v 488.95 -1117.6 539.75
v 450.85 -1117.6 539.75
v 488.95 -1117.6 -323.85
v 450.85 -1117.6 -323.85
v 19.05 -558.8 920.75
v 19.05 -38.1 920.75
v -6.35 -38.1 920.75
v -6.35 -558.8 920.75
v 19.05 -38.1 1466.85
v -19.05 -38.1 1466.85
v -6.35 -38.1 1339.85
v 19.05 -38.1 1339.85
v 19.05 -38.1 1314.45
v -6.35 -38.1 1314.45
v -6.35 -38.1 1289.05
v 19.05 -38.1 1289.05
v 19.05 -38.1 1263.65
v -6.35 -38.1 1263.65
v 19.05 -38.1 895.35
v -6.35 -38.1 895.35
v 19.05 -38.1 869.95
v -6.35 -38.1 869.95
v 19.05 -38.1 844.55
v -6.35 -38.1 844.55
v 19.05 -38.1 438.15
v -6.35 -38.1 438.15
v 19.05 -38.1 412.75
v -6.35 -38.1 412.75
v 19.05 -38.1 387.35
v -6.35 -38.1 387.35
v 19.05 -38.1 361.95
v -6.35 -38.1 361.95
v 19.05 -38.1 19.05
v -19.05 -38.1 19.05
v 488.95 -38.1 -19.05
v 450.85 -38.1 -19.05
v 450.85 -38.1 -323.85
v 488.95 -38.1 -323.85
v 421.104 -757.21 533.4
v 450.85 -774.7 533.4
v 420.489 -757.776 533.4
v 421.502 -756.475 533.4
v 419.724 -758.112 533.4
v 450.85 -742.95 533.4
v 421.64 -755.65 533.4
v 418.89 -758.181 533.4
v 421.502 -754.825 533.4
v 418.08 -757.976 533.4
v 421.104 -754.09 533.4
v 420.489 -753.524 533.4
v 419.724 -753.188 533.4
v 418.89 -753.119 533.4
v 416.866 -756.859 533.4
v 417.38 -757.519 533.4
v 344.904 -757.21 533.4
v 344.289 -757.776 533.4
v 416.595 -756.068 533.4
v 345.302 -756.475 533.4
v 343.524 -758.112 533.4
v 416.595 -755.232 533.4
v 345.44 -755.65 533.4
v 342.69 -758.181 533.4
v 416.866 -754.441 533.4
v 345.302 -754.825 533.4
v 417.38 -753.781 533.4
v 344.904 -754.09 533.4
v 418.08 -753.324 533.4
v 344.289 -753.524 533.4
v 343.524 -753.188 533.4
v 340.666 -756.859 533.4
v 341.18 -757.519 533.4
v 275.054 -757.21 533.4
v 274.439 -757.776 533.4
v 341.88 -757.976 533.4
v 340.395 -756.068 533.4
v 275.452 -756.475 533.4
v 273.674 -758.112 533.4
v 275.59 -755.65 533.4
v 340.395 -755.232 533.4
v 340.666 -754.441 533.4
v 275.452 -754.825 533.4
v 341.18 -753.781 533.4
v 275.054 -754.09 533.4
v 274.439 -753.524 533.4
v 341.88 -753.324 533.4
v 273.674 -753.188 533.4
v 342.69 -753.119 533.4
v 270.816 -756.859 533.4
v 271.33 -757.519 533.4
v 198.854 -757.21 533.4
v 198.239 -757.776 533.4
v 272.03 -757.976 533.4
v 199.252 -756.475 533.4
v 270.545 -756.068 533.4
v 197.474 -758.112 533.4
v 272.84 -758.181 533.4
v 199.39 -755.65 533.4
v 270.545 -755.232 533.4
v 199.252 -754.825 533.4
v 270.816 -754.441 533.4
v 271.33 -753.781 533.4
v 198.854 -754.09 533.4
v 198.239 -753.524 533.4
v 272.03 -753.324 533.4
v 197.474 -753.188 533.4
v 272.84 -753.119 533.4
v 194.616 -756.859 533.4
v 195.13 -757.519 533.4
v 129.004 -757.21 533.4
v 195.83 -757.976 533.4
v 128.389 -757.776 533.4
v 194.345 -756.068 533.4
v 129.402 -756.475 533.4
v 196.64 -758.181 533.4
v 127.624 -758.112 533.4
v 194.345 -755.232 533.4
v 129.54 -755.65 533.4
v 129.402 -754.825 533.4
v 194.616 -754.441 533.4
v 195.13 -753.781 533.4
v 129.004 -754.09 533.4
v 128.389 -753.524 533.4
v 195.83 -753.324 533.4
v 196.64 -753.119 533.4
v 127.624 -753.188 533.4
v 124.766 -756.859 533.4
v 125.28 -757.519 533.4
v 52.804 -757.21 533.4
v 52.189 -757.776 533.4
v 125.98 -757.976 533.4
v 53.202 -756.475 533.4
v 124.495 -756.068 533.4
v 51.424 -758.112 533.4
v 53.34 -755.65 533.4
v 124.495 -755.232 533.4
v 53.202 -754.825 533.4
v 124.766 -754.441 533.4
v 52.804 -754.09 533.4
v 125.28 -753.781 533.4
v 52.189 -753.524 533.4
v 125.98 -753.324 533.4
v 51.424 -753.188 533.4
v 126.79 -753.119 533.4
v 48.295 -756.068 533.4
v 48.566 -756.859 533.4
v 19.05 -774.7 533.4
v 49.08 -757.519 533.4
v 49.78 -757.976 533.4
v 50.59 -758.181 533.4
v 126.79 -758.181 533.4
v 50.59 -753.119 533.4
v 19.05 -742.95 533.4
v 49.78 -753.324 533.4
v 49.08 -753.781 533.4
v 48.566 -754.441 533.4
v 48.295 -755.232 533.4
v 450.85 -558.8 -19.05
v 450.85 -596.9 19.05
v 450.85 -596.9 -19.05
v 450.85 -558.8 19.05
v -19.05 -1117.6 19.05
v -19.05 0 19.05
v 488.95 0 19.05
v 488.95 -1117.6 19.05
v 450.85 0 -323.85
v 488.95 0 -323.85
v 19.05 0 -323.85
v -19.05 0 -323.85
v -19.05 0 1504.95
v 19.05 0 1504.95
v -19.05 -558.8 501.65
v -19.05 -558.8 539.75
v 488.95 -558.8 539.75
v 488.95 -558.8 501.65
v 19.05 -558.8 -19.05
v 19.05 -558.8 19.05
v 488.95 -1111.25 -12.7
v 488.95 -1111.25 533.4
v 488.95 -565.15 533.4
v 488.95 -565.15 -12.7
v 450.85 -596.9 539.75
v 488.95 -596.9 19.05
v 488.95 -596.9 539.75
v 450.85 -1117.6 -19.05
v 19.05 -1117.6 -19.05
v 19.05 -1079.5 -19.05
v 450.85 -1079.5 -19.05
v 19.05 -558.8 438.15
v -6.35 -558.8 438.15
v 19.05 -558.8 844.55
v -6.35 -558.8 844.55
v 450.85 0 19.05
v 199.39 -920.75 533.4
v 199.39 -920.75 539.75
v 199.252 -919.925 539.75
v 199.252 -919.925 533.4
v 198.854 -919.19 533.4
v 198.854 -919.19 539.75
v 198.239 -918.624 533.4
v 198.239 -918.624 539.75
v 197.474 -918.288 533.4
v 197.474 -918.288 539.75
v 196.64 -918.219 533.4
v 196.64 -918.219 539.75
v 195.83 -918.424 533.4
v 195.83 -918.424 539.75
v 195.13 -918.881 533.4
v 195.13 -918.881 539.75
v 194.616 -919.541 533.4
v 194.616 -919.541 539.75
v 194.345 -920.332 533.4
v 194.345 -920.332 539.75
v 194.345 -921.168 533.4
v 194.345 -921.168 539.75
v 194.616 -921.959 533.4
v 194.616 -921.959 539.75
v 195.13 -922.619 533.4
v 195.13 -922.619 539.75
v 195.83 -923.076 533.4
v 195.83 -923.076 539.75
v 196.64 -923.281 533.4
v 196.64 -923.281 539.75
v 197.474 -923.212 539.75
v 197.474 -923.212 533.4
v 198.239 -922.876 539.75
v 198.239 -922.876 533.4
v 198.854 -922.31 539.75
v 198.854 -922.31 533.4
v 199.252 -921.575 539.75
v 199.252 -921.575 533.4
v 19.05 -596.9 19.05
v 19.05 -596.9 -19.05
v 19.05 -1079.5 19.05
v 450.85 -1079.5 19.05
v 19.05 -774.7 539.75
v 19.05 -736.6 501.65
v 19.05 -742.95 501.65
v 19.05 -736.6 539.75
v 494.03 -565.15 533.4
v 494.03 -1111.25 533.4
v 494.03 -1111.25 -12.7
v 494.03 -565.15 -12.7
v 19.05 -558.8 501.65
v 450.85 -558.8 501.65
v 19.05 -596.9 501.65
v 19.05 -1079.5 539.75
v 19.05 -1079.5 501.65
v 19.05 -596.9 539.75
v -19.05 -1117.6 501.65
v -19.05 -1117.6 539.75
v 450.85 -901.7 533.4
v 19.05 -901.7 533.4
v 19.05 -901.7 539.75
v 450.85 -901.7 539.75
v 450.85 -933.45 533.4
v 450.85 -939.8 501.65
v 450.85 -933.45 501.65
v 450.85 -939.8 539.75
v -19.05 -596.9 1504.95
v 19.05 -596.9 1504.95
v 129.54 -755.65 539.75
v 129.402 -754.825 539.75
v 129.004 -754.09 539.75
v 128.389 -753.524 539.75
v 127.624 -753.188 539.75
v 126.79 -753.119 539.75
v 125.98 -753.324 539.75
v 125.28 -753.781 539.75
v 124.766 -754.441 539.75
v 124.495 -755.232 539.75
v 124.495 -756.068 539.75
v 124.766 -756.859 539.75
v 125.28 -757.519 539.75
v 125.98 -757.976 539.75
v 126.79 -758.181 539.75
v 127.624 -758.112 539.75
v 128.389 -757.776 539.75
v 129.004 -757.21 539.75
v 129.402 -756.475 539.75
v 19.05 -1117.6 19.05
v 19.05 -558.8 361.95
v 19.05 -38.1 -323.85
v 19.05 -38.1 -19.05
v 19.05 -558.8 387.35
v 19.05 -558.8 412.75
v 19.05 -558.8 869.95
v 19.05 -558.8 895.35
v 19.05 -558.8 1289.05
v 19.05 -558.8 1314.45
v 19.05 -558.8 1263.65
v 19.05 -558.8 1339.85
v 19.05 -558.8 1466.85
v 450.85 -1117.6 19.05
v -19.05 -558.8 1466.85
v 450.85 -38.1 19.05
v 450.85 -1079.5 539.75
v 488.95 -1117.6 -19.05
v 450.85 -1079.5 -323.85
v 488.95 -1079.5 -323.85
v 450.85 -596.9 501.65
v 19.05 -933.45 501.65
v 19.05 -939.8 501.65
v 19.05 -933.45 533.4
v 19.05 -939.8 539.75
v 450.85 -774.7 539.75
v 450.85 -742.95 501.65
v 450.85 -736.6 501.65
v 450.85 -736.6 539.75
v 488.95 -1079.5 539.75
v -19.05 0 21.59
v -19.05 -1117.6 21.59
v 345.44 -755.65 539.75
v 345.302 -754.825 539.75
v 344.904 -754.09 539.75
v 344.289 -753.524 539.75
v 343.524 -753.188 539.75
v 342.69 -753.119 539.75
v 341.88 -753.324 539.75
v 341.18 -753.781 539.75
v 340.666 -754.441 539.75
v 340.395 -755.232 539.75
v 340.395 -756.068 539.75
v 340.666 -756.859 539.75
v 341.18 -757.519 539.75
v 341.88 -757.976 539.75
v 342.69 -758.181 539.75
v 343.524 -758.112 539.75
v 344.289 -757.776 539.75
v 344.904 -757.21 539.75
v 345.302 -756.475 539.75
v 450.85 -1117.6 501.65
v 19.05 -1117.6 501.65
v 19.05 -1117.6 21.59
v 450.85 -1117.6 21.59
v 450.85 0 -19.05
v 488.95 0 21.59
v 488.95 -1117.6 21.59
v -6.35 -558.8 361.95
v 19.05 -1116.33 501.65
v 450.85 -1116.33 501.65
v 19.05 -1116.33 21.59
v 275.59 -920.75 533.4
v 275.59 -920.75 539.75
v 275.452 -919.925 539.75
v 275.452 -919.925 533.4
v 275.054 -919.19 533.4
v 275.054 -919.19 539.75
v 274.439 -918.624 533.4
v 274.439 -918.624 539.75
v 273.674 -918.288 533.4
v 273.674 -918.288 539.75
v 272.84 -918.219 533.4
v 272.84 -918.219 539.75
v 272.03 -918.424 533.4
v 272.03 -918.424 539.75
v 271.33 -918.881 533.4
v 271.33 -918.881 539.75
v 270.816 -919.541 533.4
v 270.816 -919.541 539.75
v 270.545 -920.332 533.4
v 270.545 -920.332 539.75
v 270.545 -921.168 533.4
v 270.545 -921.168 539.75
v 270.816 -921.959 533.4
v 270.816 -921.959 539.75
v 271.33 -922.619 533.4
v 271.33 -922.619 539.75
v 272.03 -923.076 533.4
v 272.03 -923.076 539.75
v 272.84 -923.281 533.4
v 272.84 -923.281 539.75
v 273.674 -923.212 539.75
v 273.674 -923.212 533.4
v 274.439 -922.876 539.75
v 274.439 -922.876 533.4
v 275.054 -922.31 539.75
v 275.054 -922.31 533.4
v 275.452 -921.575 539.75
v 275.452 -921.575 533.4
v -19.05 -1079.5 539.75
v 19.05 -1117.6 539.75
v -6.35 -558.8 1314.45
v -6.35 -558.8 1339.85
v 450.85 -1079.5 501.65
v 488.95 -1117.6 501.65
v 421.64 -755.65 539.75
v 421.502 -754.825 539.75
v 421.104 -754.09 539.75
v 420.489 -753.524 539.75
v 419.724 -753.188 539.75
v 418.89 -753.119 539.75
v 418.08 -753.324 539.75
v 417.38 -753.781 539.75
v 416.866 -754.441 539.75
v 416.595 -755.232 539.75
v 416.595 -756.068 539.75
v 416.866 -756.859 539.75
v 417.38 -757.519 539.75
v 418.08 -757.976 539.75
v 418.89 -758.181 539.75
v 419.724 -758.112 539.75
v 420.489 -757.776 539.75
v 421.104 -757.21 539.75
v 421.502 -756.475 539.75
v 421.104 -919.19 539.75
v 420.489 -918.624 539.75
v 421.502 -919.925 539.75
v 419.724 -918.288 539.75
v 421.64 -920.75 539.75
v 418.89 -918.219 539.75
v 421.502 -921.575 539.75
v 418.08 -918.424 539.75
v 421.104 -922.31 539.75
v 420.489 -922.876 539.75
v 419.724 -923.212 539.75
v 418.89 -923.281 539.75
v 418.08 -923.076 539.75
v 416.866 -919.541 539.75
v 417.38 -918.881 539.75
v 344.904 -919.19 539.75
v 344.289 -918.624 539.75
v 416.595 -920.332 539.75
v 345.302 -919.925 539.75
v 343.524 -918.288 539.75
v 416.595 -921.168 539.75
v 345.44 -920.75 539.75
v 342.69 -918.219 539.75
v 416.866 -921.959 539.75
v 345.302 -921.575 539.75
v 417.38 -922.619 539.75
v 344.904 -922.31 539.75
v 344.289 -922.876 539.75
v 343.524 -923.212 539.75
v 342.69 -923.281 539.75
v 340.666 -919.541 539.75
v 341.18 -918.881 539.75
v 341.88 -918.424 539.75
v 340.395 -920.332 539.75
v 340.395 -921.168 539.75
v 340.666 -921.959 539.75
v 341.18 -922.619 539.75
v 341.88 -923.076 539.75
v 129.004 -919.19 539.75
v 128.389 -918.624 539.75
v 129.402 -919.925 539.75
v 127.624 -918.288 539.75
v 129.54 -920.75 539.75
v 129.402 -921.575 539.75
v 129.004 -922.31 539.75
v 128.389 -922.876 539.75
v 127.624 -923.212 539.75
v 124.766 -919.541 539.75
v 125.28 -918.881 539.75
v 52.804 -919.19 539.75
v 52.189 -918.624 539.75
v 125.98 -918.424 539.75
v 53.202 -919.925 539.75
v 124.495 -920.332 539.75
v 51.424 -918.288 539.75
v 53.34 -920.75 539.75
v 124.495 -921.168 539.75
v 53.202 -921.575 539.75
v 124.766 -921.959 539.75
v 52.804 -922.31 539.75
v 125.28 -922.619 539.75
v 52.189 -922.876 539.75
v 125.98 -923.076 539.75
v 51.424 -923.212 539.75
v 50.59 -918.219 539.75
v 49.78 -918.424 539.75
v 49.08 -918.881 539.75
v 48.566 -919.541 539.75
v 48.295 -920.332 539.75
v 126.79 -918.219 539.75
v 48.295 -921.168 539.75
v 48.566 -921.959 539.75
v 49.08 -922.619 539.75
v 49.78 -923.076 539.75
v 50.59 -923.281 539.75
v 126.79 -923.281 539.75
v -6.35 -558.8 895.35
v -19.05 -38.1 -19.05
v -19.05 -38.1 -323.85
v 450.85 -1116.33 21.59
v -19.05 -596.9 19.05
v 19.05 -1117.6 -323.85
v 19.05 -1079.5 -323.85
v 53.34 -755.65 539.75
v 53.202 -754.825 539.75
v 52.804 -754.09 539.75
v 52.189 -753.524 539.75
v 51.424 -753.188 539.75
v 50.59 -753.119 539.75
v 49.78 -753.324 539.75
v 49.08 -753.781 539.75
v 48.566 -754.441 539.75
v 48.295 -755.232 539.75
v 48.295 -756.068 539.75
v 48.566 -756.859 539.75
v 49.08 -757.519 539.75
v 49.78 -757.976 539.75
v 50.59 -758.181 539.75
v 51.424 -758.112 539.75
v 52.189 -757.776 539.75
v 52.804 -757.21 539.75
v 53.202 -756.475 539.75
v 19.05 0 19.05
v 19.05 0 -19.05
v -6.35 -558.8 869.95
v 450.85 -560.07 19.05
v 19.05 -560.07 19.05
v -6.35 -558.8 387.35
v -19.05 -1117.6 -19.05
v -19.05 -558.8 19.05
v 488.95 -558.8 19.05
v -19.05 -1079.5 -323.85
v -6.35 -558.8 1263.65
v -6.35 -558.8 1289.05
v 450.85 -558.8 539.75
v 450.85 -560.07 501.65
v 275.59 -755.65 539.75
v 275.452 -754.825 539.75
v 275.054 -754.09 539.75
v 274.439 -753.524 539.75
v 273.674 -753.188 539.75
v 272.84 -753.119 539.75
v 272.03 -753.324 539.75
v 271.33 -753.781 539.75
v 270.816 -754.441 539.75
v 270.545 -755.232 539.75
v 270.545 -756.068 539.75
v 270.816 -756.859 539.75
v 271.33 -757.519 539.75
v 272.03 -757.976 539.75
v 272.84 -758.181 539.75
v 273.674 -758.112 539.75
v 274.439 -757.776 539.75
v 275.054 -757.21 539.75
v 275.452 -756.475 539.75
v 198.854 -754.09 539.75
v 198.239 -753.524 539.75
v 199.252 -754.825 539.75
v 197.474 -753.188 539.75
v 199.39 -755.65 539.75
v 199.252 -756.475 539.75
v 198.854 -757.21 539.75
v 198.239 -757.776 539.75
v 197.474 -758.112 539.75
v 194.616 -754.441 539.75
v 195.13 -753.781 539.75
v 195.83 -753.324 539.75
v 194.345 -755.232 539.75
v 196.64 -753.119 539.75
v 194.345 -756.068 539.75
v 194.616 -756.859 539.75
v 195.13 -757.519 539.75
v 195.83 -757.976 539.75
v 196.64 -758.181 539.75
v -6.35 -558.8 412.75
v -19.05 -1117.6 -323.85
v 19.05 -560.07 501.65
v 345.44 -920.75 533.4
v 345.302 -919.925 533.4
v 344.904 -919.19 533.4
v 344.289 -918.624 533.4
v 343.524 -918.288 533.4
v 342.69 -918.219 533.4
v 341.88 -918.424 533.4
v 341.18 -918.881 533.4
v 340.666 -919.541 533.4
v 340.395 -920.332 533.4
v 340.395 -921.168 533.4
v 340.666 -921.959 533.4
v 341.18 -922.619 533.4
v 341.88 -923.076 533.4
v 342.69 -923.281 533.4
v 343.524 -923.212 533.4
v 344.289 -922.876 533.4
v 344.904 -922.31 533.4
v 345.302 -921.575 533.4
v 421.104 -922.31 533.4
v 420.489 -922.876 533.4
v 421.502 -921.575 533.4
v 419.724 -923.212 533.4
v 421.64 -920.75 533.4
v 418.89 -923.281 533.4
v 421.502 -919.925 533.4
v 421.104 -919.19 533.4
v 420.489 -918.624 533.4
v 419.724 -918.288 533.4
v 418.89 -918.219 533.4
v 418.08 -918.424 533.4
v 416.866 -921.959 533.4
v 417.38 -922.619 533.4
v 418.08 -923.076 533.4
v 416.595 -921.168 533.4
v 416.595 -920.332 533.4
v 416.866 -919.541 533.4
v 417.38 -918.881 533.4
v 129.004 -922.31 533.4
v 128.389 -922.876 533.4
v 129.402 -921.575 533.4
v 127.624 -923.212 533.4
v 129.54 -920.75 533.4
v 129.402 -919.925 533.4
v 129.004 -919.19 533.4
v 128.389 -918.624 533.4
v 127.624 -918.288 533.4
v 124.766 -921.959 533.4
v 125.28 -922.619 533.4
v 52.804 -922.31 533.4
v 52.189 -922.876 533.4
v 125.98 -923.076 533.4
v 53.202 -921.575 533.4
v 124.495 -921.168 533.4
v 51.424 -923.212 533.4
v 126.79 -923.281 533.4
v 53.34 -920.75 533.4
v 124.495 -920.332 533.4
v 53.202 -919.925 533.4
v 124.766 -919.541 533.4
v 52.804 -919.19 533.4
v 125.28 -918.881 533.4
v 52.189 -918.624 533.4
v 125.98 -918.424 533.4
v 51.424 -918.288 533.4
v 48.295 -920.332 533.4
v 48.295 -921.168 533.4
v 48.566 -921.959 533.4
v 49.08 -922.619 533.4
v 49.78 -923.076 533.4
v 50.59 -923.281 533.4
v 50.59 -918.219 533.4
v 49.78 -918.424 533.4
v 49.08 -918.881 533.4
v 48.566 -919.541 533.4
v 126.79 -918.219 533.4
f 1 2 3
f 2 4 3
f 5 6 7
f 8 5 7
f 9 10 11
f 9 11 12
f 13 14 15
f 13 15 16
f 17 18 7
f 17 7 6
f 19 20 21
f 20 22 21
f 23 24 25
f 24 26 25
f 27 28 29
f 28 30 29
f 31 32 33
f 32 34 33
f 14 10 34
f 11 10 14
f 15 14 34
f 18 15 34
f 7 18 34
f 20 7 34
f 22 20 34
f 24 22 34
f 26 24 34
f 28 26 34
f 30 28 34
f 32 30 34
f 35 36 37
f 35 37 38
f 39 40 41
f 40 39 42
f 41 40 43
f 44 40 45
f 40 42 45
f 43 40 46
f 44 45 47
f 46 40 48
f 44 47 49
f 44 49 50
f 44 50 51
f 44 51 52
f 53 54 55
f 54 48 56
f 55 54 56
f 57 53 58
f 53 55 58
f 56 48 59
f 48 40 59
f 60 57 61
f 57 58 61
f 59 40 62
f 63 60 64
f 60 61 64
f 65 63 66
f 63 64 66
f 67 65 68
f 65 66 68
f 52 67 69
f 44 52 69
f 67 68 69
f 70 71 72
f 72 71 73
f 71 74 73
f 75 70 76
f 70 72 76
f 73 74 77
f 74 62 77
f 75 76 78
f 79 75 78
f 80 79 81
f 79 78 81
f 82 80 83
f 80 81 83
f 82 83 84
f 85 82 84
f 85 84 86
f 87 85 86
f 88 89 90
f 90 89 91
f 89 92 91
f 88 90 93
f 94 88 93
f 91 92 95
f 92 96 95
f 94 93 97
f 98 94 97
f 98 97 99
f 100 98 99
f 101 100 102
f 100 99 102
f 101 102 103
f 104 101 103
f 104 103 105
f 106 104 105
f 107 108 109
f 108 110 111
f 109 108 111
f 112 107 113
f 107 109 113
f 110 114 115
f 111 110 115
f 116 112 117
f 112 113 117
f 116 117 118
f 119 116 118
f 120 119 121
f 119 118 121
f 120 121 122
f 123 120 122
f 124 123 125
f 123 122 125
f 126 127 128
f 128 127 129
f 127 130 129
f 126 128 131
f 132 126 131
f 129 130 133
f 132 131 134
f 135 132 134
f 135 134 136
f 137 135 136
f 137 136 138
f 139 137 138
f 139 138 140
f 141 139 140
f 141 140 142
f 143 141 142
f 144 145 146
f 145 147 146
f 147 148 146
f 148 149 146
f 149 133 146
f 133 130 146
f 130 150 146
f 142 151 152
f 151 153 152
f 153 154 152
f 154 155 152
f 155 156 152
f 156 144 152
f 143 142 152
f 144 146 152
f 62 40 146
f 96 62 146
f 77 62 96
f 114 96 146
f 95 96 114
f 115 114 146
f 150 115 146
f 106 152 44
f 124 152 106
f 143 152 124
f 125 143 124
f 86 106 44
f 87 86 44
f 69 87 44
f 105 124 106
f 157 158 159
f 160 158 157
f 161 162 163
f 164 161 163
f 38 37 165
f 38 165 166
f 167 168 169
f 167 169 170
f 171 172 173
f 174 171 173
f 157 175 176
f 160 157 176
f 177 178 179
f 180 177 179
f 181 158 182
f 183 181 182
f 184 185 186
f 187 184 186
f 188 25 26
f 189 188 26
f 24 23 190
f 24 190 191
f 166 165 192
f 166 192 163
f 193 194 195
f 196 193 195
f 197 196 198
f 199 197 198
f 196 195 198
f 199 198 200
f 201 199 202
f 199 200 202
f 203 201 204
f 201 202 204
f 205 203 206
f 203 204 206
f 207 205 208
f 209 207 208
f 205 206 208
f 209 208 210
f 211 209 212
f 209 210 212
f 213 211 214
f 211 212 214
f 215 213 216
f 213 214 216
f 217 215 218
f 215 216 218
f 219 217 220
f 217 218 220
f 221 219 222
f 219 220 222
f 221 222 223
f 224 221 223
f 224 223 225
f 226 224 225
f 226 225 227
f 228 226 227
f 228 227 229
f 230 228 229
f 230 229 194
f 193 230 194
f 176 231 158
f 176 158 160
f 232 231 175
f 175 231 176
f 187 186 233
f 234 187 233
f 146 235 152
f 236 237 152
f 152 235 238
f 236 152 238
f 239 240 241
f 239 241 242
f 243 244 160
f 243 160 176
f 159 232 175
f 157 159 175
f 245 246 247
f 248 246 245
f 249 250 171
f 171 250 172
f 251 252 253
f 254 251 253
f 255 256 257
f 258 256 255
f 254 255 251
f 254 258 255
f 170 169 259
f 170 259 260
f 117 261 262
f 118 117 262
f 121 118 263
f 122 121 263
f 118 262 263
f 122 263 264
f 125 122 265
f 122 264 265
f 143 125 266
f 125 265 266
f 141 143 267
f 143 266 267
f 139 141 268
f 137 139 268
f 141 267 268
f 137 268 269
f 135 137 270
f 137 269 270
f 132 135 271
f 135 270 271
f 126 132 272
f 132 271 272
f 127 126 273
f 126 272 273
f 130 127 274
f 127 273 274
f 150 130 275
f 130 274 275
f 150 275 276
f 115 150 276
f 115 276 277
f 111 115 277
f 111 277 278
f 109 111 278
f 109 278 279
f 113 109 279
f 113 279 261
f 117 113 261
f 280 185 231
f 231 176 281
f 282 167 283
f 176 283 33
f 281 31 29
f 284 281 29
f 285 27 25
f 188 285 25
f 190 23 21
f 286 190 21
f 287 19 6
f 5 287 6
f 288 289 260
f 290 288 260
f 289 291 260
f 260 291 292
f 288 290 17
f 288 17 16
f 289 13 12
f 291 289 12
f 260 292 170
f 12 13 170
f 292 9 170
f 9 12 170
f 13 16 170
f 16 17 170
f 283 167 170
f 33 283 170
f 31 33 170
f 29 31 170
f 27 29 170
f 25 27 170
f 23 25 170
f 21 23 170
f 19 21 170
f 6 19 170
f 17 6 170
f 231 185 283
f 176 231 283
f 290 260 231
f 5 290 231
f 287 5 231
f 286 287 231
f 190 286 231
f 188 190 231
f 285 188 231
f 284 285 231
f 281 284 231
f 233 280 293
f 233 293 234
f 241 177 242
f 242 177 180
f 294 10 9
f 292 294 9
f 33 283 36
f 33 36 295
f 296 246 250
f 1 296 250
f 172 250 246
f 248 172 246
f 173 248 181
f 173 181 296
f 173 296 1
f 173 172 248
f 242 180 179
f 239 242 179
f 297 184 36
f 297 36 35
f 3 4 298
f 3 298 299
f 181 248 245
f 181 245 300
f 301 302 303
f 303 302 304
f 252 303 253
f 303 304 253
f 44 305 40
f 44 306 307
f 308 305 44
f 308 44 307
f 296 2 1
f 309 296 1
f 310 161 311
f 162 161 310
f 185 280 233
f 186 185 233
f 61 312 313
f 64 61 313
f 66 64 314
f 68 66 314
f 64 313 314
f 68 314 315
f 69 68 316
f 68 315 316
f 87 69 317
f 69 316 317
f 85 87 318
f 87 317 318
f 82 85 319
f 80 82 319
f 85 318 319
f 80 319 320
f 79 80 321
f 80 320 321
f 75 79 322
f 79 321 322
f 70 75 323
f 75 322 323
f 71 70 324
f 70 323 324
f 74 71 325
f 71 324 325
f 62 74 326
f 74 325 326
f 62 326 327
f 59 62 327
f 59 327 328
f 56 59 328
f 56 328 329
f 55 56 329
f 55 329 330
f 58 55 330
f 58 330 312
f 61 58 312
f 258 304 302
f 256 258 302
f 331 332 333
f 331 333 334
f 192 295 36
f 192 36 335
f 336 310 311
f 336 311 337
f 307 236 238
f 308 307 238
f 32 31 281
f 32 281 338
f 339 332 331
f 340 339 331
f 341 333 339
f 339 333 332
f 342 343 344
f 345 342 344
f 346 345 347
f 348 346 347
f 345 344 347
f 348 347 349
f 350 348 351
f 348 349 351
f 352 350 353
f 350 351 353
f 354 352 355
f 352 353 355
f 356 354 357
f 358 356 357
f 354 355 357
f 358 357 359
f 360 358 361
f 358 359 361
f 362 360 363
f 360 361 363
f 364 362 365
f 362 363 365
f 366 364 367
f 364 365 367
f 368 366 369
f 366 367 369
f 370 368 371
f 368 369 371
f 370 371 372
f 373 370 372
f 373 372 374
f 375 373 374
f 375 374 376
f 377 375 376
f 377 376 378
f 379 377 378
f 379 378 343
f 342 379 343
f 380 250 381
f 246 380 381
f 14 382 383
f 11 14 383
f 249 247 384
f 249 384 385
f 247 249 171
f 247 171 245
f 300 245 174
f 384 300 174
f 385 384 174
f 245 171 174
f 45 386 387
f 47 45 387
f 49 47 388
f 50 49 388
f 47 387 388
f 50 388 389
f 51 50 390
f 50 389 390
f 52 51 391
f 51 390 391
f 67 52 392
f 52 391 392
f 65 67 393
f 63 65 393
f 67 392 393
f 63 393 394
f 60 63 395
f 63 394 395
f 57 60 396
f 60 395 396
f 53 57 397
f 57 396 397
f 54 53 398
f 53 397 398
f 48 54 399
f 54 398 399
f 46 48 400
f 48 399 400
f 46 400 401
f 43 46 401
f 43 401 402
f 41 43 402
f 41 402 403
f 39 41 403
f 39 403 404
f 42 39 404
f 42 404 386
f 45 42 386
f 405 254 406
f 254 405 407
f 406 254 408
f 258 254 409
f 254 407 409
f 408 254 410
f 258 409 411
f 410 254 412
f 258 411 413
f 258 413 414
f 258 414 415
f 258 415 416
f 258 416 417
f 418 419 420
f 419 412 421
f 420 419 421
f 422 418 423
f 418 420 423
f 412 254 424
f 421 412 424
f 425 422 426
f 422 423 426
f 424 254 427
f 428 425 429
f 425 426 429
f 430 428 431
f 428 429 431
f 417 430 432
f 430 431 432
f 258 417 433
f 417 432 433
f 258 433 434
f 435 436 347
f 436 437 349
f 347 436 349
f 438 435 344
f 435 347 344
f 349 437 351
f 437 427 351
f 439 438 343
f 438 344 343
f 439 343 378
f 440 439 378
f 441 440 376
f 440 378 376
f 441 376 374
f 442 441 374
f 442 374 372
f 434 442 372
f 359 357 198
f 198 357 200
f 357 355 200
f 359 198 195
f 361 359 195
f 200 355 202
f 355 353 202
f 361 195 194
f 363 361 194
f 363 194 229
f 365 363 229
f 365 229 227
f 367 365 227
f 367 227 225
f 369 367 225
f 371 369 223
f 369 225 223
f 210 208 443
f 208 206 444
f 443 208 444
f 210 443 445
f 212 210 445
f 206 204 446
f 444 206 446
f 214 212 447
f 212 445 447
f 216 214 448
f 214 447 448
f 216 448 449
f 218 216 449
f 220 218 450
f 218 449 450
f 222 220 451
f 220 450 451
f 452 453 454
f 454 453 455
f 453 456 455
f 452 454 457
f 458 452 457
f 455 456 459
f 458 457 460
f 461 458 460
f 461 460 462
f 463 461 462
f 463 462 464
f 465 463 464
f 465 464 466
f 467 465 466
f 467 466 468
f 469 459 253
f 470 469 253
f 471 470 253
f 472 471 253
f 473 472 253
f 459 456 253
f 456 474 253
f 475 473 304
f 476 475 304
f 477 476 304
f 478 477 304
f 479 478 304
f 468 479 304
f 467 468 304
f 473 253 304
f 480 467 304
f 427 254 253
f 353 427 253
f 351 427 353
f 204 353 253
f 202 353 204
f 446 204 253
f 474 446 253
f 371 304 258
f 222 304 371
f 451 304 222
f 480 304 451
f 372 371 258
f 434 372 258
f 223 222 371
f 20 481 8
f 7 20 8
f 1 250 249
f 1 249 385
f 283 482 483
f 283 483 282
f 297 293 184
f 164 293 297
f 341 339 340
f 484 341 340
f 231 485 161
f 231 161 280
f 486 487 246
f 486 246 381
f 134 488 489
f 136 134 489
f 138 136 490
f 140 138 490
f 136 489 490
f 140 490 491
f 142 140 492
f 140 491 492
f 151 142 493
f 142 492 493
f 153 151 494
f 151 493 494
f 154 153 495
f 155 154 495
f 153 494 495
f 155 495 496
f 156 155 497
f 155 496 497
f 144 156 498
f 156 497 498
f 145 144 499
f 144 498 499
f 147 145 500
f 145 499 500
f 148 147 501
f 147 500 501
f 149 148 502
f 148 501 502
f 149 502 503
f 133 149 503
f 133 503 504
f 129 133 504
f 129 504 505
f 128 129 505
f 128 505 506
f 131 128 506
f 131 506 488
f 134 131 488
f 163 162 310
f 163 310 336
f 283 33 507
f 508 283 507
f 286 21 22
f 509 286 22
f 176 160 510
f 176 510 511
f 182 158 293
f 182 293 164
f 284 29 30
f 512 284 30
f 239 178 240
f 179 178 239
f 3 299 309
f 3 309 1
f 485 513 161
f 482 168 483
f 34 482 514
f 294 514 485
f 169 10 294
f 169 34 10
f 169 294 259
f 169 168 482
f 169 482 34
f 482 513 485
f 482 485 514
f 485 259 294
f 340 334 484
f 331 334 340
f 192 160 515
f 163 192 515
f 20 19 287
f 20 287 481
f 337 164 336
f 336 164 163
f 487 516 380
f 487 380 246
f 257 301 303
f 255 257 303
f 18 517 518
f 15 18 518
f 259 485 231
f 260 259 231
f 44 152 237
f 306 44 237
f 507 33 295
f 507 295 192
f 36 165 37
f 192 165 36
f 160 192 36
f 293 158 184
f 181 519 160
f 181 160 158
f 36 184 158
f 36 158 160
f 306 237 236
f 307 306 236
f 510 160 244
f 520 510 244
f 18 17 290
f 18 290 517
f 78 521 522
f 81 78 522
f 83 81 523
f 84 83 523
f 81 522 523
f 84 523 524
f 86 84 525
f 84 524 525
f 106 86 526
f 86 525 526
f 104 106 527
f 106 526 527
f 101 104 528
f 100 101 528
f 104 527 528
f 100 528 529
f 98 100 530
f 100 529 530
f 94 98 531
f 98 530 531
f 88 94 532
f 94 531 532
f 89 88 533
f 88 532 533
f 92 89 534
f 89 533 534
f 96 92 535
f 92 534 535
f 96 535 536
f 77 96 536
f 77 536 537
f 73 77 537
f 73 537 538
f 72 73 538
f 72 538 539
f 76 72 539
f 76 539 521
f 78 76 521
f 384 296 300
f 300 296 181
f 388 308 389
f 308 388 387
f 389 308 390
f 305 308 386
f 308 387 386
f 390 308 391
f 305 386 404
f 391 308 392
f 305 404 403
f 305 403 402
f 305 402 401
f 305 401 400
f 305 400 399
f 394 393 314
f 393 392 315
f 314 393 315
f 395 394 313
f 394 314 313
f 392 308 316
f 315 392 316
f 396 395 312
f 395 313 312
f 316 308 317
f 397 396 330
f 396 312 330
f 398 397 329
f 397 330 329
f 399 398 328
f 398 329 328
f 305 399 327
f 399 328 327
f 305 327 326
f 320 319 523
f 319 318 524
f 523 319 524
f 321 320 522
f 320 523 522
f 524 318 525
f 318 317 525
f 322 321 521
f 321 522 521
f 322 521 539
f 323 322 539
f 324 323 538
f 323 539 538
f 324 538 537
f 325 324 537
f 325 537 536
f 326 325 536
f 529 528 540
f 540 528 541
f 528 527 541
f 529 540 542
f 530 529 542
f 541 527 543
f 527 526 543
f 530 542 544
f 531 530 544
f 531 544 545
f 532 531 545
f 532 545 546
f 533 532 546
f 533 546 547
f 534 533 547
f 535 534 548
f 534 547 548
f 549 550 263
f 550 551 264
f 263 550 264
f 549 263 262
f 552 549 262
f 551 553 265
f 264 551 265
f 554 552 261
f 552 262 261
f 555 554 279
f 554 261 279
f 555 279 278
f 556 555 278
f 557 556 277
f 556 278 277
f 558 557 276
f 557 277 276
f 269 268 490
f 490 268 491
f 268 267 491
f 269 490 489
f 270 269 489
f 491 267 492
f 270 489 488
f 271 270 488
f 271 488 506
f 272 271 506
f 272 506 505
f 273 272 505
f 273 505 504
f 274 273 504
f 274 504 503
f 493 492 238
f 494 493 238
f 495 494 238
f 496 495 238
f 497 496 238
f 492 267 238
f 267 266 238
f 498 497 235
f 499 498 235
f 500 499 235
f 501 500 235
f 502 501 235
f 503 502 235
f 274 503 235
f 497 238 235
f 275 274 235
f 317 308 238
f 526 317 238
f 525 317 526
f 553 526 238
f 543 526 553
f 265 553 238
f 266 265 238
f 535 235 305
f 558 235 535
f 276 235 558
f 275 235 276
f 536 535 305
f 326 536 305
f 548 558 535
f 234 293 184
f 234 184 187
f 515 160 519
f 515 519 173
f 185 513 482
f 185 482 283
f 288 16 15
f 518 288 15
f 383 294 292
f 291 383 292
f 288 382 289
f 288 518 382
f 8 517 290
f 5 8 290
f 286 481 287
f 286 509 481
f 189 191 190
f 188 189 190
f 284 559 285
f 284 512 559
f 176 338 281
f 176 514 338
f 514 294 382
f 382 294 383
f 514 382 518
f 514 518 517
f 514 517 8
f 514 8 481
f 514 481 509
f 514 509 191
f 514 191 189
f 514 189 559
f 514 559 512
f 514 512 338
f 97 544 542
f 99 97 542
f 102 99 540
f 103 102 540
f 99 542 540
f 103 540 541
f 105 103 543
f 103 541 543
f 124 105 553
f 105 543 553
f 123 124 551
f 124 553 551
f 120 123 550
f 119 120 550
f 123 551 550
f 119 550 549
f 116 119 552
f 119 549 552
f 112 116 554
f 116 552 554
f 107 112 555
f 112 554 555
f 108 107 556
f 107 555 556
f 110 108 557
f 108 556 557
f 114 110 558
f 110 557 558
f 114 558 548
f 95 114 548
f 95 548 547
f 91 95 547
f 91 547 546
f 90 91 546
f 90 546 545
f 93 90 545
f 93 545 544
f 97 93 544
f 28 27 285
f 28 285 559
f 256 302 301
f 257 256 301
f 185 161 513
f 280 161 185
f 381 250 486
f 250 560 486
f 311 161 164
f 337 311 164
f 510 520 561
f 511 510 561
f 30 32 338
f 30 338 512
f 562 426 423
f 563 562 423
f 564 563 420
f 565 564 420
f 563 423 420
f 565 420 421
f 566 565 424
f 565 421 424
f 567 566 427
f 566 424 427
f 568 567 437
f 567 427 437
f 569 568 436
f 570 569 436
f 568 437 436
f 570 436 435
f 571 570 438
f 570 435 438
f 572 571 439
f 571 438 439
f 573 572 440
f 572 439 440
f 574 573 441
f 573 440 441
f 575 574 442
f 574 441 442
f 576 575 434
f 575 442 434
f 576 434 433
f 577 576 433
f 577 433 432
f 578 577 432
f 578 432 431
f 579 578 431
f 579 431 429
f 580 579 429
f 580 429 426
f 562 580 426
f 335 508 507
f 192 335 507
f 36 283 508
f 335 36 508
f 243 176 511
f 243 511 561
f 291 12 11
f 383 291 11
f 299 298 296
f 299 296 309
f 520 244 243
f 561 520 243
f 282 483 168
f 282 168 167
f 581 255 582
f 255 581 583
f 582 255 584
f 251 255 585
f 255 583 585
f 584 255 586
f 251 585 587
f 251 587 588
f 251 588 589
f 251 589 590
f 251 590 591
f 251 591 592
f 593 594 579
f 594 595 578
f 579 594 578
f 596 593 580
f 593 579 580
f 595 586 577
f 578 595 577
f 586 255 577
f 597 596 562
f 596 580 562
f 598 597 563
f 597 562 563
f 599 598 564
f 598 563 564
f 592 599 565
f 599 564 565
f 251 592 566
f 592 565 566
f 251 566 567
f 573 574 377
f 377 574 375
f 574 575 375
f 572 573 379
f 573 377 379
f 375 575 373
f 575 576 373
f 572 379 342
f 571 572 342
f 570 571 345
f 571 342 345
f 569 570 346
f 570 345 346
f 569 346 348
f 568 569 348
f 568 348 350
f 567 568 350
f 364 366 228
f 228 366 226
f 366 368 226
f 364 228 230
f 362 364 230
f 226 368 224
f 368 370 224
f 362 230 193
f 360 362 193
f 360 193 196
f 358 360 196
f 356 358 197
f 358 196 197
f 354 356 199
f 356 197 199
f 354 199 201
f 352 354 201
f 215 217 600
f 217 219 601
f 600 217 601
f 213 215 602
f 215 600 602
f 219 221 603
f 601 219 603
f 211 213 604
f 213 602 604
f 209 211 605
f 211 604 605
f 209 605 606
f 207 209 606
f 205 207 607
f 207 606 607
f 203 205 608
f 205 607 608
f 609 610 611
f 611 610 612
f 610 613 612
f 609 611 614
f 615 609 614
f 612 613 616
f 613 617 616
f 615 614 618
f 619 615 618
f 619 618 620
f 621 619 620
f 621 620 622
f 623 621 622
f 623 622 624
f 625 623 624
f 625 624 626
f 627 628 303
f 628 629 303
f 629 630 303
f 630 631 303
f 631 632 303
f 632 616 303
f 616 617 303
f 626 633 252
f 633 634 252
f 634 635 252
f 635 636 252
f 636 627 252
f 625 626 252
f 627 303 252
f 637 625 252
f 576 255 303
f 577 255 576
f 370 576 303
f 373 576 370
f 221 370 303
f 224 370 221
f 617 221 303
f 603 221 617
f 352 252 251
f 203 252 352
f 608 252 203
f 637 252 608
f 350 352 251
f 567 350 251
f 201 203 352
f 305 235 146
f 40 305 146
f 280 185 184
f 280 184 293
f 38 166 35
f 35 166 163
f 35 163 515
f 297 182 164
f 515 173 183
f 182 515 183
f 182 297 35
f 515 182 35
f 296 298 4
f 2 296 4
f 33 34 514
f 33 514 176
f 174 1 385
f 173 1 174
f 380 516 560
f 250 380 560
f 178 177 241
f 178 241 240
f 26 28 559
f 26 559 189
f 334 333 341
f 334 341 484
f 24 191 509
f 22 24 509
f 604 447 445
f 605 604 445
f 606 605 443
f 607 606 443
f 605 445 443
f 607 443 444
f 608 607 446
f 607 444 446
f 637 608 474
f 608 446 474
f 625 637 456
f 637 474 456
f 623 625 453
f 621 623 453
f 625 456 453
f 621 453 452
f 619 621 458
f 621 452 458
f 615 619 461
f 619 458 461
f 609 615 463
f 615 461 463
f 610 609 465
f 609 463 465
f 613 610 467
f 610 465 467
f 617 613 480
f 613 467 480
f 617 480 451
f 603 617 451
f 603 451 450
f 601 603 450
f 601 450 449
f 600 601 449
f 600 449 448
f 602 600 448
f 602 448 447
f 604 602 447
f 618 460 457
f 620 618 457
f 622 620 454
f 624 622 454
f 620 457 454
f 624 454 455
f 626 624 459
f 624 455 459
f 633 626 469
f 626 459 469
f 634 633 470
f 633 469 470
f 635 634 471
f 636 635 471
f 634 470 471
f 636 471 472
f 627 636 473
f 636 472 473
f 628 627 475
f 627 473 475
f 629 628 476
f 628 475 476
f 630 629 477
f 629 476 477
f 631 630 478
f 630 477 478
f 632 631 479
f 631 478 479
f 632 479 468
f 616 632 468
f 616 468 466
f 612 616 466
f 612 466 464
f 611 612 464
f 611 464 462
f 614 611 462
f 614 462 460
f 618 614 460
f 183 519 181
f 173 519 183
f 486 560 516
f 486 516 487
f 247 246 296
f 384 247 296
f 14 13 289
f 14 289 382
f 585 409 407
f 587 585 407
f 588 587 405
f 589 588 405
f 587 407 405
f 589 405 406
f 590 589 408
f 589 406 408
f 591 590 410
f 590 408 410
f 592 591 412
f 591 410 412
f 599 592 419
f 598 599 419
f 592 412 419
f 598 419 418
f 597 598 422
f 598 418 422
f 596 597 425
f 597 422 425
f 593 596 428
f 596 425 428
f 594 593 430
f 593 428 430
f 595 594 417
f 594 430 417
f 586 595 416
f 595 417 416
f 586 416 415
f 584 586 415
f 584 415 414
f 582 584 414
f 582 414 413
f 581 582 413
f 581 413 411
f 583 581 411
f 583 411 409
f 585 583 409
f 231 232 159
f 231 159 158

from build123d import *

# Parameters (mm, degrees)
F0_W          = 38.1
F0_H          = 38.1
F1_DEPTH      = 1117.6
F2_W          = 38.1
F2_H          = 38.1
F3_DEPTH      = 304.8
F3_DEPTH_BACK = 558.8
F4_W          = 38.1
F4_H          = 38.1
F5_DEPTH      = 304.8
F5_DEPTH_BACK = 1524
F6_W          = 38.1
F6_H          = 38.1
F7_DEPTH      = 1485.9
F8_W          = 38.1
F8_H          = 38.1
F9_DEPTH      = 431.8
F10_W         = 38.1
F10_H         = 38.1
F11_DEPTH     = 304.8
F12_W         = 38.1
F12_H         = 38.1
F13_DEPTH     = 520.7
F14_W         = 508
F14_H         = 558.8
F14_W_2       = 431.8
F14_H_2       = 482.6
F15_DEPTH     = 38.1
F16_W         = 38.1
F16_H         = 38.1
F17_DEPTH     = 431.8
F18_W         = 38.1
F18_H         = 38.1
F19_DEPTH     = 520.7
F21_DEPTH     = 431.8
F24_W         = 508
F24_H         = 1117.6
F25_DEPTH     = 2.54
F26_W         = 431.8
F26_H         = 482.6
F27_DEPTH     = 1.27
F28_W         = 431.8
F28_H         = 480.06
F29_DEPTH     = 1.27
F30_W         = 546.1
F30_H         = 546.1
F31_DEPTH     = 5.08
F32_W         = 25.4
F32_H         = 25.4
F33_DEPTH     = 520.7
F34_R         = 2.54
F35_DEPTH     = 6.35


with BuildPart() as f1:
    # F0 (on Front) → F1 (new body)
    with BuildSketch(Plane.XZ):
        Rectangle(F0_W, F0_H)
    extrude(amount=F1_DEPTH)

    # F4 (on face) → F5 (join, two sides)
    with BuildSketch(Plane(origin=(0, 0, -19.05), x_dir=(1, 0, 0), z_dir=(0, 0, -1))) as f5_sk:
        with Locations((0, 19.05)):
            Rectangle(F4_W, F4_H)
    extrude(amount=F5_DEPTH)
    extrude(f5_sk.sketch, amount=-F5_DEPTH_BACK)

    # F6 (on face) → F7 (join, through all)
    with BuildSketch(Plane.XY.offset(19.05)):
        with Locations((0, -577.85)):
            Rectangle(F6_W, F6_H)
    extrude(amount=F7_DEPTH)

    # F18 (on face) → F19 (join, through all)
    with BuildSketch(Plane.XZ.offset(38.1)):
        with Locations((0, 1485.9)):
            Rectangle(F18_W, F18_H)
    extrude(amount=F19_DEPTH)

    # F32 (on face) → F33 (join, through all)
    with BuildSketch(Plane(origin=(0, -558.8, 0), x_dir=(-1, 0, 0), z_dir=(0, 1, 0))):
        with Locations((-6.35, 425.45)):
            Rectangle(F32_W, F32_H)
        with Locations((-6.35, 908.05)):
            Rectangle(F32_W, F32_H)
        with Locations((-6.35, 1327.15)):
            Rectangle(F32_W, F32_H)
        with Locations((-6.35, 1276.35)):
            Rectangle(F32_W, F32_H)
        with Locations((-6.35, 857.25)):
            Rectangle(F32_W, F32_H)
        with Locations((-6.35, 374.65)):
            Rectangle(F32_W, F32_H)
    extrude(amount=F33_DEPTH)


with BuildPart() as f1b:
    # F0 (on Front) → F1, piece 2 (new body)
    with BuildSketch(Plane.XZ):
        with Locations((469.9, 0)):
            Rectangle(F0_W, F0_H)
    extrude(amount=F1_DEPTH)

    # F10 (on face) → F11 (join, through all)
    with BuildSketch(Plane(origin=(0, 0, -19.05), x_dir=(1, 0, 0), z_dir=(0, 0, -1))):
        with Locations((469.9, 19.05)):
            Rectangle(F10_W, F10_H)
    extrude(amount=F11_DEPTH)

    # F12 (on face) → F13 (join, through all)
    with BuildSketch(Plane.XY.offset(19.05)):
        with Locations((469.9, -577.85)):
            Rectangle(F12_W, F12_H)
    extrude(amount=F13_DEPTH)


with BuildPart() as f3:
    # F2 (on face) → F3 (new body, two sides)
    with BuildSketch(Plane(origin=(0, 0, -19.05), x_dir=(1, 0, 0), z_dir=(0, 0, -1))) as f3_sk:
        with Locations((469.9, 1098.55)):
            Rectangle(F2_W, F2_H)
    extrude(amount=F3_DEPTH)
    extrude(f3_sk.sketch, amount=-F3_DEPTH_BACK)


with BuildPart() as f3b:
    # F2 (on face) → F3, piece 2 (new body, two sides)
    with BuildSketch(Plane(origin=(0, 0, -19.05), x_dir=(1, 0, 0), z_dir=(0, 0, -1))) as f3_2_sk:
        with Locations((0, 1098.55)):
            Rectangle(F2_W, F2_H)
    extrude(amount=F3_DEPTH)
    extrude(f3_2_sk.sketch, amount=-F3_DEPTH_BACK)


with BuildPart() as f9:
    # F8 (on face) → F9 (new body, through all)
    with BuildSketch(Plane.YZ.offset(19.05)):
        with Locations((-1098.55, 0)):
            Rectangle(F8_W, F8_H)
    extrude(amount=F9_DEPTH)


with BuildPart() as f9b:
    # F8 (on face) → F9, piece 2 (new body, through all)
    with BuildSketch(Plane.YZ.offset(19.05)):
        with Locations((-19.05, 0)):
            Rectangle(F8_W, F8_H)
    extrude(amount=F9_DEPTH)


with BuildPart() as f15:
    # F14 (on face) → F15 (new body)
    with BuildSketch(Plane.XY.offset(539.75)):
        with Locations((234.95, -838.2)):
            Rectangle(F14_W, F14_H)
        with Locations((234.95, -838.2)):
            Rectangle(F14_W_2, F14_H_2, mode=Mode.SUBTRACT)
    extrude(amount=-F15_DEPTH)


with BuildPart() as f17:
    # F16 (on face) → F17 (new body, through all)
    with BuildSketch(Plane.YZ.offset(19.05)):
        with Locations((-577.85, 0)):
            Rectangle(F16_W, F16_H)
    extrude(amount=F17_DEPTH)


with BuildPart() as f21:
    # F20 (on face) → F21 (new body, through all)
    with BuildSketch(Plane.YZ.offset(19.05)):
        Polygon((-736.6, 501.65), (-736.6, 539.75), (-774.7, 539.75), (-774.7, 533.4), (-742.95, 533.4), (-742.95, 501.65), align=None)
    extrude(amount=F21_DEPTH)


with BuildPart() as f21b:
    # F20 (on face) → F21, piece 2 (new body, through all)
    with BuildSketch(Plane.YZ.offset(19.05)):
        Polygon((-901.7, 539.75), (-939.8, 539.75), (-939.8, 501.65), (-933.45, 501.65), (-933.45, 533.4), (-901.7, 533.4), align=None)
    extrude(amount=F21_DEPTH)


with BuildPart() as f25:
    # F24 (on face) → F25 (new body)
    with BuildSketch(Plane.XY.offset(19.05)):
        with Locations((234.95, -558.8)):
            Rectangle(F24_W, F24_H)
    extrude(amount=F25_DEPTH)


with BuildPart() as f27:
    # F26 (on face) → F27 (new body)
    with BuildSketch(Plane(origin=(0, -558.8, 0), x_dir=(-1, 0, 0), z_dir=(0, 1, 0))):
        with Locations((-234.95, 260.35)):
            Rectangle(F26_W, F26_H)
    extrude(amount=-F27_DEPTH)


with BuildPart() as f29:
    # F28 (on face) → F29 (new body)
    with BuildSketch(Plane.XZ.offset(1117.6)):
        with Locations((234.95, 261.62)):
            Rectangle(F28_W, F28_H)
    extrude(amount=-F29_DEPTH)


with BuildPart() as f31:
    # F30 (on face) → F31 (new body)
    with BuildSketch(Plane.YZ.offset(488.95)):
        with Locations((-838.2, 260.35)):
            Rectangle(F30_W, F30_H)
    extrude(amount=F31_DEPTH)


with BuildPart() as f35_tool:
    # F34 (on face) → F35 (new body, through all)
    with BuildSketch(Plane.XY.offset(539.75)):
        with Locations((50.8, -755.65)):
            Circle(F34_R)
        with Locations((127, -755.65)):
            Circle(F34_R)
        with Locations((196.85, -755.65)):
            Circle(F34_R)
        with Locations((273.05, -755.65)):
            Circle(F34_R)
        with Locations((342.9, -755.65)):
            Circle(F34_R)
        with Locations((419.1, -755.65)):
            Circle(F34_R)
        with Locations((50.8, -920.75)):
            Circle(F34_R)
        with Locations((127, -920.75)):
            Circle(F34_R)
        with Locations((196.85, -920.75)):
            Circle(F34_R)
        with Locations((273.05, -920.75)):
            Circle(F34_R)
        with Locations((342.9, -920.75)):
            Circle(F34_R)
        with Locations((419.1, -920.75)):
            Circle(F34_R)
    extrude(amount=-F35_DEPTH)


with BuildPart() as f21_1:
    add(f21.part)

    # F35: cut by f35_tool
    add(f35_tool.part, mode=Mode.SUBTRACT)


with BuildPart() as f21b_1:
    add(f21b.part)

    # F35: cut by f35_tool
    add(f35_tool.part, mode=Mode.SUBTRACT)


solid = Compound([f1.part, f1b.part, f3.part, f3b.part, f9.part, f9b.part, f15.part, f17.part, f25.part, f27.part, f29.part, f31.part, f21_1.part, f21b_1.part])
